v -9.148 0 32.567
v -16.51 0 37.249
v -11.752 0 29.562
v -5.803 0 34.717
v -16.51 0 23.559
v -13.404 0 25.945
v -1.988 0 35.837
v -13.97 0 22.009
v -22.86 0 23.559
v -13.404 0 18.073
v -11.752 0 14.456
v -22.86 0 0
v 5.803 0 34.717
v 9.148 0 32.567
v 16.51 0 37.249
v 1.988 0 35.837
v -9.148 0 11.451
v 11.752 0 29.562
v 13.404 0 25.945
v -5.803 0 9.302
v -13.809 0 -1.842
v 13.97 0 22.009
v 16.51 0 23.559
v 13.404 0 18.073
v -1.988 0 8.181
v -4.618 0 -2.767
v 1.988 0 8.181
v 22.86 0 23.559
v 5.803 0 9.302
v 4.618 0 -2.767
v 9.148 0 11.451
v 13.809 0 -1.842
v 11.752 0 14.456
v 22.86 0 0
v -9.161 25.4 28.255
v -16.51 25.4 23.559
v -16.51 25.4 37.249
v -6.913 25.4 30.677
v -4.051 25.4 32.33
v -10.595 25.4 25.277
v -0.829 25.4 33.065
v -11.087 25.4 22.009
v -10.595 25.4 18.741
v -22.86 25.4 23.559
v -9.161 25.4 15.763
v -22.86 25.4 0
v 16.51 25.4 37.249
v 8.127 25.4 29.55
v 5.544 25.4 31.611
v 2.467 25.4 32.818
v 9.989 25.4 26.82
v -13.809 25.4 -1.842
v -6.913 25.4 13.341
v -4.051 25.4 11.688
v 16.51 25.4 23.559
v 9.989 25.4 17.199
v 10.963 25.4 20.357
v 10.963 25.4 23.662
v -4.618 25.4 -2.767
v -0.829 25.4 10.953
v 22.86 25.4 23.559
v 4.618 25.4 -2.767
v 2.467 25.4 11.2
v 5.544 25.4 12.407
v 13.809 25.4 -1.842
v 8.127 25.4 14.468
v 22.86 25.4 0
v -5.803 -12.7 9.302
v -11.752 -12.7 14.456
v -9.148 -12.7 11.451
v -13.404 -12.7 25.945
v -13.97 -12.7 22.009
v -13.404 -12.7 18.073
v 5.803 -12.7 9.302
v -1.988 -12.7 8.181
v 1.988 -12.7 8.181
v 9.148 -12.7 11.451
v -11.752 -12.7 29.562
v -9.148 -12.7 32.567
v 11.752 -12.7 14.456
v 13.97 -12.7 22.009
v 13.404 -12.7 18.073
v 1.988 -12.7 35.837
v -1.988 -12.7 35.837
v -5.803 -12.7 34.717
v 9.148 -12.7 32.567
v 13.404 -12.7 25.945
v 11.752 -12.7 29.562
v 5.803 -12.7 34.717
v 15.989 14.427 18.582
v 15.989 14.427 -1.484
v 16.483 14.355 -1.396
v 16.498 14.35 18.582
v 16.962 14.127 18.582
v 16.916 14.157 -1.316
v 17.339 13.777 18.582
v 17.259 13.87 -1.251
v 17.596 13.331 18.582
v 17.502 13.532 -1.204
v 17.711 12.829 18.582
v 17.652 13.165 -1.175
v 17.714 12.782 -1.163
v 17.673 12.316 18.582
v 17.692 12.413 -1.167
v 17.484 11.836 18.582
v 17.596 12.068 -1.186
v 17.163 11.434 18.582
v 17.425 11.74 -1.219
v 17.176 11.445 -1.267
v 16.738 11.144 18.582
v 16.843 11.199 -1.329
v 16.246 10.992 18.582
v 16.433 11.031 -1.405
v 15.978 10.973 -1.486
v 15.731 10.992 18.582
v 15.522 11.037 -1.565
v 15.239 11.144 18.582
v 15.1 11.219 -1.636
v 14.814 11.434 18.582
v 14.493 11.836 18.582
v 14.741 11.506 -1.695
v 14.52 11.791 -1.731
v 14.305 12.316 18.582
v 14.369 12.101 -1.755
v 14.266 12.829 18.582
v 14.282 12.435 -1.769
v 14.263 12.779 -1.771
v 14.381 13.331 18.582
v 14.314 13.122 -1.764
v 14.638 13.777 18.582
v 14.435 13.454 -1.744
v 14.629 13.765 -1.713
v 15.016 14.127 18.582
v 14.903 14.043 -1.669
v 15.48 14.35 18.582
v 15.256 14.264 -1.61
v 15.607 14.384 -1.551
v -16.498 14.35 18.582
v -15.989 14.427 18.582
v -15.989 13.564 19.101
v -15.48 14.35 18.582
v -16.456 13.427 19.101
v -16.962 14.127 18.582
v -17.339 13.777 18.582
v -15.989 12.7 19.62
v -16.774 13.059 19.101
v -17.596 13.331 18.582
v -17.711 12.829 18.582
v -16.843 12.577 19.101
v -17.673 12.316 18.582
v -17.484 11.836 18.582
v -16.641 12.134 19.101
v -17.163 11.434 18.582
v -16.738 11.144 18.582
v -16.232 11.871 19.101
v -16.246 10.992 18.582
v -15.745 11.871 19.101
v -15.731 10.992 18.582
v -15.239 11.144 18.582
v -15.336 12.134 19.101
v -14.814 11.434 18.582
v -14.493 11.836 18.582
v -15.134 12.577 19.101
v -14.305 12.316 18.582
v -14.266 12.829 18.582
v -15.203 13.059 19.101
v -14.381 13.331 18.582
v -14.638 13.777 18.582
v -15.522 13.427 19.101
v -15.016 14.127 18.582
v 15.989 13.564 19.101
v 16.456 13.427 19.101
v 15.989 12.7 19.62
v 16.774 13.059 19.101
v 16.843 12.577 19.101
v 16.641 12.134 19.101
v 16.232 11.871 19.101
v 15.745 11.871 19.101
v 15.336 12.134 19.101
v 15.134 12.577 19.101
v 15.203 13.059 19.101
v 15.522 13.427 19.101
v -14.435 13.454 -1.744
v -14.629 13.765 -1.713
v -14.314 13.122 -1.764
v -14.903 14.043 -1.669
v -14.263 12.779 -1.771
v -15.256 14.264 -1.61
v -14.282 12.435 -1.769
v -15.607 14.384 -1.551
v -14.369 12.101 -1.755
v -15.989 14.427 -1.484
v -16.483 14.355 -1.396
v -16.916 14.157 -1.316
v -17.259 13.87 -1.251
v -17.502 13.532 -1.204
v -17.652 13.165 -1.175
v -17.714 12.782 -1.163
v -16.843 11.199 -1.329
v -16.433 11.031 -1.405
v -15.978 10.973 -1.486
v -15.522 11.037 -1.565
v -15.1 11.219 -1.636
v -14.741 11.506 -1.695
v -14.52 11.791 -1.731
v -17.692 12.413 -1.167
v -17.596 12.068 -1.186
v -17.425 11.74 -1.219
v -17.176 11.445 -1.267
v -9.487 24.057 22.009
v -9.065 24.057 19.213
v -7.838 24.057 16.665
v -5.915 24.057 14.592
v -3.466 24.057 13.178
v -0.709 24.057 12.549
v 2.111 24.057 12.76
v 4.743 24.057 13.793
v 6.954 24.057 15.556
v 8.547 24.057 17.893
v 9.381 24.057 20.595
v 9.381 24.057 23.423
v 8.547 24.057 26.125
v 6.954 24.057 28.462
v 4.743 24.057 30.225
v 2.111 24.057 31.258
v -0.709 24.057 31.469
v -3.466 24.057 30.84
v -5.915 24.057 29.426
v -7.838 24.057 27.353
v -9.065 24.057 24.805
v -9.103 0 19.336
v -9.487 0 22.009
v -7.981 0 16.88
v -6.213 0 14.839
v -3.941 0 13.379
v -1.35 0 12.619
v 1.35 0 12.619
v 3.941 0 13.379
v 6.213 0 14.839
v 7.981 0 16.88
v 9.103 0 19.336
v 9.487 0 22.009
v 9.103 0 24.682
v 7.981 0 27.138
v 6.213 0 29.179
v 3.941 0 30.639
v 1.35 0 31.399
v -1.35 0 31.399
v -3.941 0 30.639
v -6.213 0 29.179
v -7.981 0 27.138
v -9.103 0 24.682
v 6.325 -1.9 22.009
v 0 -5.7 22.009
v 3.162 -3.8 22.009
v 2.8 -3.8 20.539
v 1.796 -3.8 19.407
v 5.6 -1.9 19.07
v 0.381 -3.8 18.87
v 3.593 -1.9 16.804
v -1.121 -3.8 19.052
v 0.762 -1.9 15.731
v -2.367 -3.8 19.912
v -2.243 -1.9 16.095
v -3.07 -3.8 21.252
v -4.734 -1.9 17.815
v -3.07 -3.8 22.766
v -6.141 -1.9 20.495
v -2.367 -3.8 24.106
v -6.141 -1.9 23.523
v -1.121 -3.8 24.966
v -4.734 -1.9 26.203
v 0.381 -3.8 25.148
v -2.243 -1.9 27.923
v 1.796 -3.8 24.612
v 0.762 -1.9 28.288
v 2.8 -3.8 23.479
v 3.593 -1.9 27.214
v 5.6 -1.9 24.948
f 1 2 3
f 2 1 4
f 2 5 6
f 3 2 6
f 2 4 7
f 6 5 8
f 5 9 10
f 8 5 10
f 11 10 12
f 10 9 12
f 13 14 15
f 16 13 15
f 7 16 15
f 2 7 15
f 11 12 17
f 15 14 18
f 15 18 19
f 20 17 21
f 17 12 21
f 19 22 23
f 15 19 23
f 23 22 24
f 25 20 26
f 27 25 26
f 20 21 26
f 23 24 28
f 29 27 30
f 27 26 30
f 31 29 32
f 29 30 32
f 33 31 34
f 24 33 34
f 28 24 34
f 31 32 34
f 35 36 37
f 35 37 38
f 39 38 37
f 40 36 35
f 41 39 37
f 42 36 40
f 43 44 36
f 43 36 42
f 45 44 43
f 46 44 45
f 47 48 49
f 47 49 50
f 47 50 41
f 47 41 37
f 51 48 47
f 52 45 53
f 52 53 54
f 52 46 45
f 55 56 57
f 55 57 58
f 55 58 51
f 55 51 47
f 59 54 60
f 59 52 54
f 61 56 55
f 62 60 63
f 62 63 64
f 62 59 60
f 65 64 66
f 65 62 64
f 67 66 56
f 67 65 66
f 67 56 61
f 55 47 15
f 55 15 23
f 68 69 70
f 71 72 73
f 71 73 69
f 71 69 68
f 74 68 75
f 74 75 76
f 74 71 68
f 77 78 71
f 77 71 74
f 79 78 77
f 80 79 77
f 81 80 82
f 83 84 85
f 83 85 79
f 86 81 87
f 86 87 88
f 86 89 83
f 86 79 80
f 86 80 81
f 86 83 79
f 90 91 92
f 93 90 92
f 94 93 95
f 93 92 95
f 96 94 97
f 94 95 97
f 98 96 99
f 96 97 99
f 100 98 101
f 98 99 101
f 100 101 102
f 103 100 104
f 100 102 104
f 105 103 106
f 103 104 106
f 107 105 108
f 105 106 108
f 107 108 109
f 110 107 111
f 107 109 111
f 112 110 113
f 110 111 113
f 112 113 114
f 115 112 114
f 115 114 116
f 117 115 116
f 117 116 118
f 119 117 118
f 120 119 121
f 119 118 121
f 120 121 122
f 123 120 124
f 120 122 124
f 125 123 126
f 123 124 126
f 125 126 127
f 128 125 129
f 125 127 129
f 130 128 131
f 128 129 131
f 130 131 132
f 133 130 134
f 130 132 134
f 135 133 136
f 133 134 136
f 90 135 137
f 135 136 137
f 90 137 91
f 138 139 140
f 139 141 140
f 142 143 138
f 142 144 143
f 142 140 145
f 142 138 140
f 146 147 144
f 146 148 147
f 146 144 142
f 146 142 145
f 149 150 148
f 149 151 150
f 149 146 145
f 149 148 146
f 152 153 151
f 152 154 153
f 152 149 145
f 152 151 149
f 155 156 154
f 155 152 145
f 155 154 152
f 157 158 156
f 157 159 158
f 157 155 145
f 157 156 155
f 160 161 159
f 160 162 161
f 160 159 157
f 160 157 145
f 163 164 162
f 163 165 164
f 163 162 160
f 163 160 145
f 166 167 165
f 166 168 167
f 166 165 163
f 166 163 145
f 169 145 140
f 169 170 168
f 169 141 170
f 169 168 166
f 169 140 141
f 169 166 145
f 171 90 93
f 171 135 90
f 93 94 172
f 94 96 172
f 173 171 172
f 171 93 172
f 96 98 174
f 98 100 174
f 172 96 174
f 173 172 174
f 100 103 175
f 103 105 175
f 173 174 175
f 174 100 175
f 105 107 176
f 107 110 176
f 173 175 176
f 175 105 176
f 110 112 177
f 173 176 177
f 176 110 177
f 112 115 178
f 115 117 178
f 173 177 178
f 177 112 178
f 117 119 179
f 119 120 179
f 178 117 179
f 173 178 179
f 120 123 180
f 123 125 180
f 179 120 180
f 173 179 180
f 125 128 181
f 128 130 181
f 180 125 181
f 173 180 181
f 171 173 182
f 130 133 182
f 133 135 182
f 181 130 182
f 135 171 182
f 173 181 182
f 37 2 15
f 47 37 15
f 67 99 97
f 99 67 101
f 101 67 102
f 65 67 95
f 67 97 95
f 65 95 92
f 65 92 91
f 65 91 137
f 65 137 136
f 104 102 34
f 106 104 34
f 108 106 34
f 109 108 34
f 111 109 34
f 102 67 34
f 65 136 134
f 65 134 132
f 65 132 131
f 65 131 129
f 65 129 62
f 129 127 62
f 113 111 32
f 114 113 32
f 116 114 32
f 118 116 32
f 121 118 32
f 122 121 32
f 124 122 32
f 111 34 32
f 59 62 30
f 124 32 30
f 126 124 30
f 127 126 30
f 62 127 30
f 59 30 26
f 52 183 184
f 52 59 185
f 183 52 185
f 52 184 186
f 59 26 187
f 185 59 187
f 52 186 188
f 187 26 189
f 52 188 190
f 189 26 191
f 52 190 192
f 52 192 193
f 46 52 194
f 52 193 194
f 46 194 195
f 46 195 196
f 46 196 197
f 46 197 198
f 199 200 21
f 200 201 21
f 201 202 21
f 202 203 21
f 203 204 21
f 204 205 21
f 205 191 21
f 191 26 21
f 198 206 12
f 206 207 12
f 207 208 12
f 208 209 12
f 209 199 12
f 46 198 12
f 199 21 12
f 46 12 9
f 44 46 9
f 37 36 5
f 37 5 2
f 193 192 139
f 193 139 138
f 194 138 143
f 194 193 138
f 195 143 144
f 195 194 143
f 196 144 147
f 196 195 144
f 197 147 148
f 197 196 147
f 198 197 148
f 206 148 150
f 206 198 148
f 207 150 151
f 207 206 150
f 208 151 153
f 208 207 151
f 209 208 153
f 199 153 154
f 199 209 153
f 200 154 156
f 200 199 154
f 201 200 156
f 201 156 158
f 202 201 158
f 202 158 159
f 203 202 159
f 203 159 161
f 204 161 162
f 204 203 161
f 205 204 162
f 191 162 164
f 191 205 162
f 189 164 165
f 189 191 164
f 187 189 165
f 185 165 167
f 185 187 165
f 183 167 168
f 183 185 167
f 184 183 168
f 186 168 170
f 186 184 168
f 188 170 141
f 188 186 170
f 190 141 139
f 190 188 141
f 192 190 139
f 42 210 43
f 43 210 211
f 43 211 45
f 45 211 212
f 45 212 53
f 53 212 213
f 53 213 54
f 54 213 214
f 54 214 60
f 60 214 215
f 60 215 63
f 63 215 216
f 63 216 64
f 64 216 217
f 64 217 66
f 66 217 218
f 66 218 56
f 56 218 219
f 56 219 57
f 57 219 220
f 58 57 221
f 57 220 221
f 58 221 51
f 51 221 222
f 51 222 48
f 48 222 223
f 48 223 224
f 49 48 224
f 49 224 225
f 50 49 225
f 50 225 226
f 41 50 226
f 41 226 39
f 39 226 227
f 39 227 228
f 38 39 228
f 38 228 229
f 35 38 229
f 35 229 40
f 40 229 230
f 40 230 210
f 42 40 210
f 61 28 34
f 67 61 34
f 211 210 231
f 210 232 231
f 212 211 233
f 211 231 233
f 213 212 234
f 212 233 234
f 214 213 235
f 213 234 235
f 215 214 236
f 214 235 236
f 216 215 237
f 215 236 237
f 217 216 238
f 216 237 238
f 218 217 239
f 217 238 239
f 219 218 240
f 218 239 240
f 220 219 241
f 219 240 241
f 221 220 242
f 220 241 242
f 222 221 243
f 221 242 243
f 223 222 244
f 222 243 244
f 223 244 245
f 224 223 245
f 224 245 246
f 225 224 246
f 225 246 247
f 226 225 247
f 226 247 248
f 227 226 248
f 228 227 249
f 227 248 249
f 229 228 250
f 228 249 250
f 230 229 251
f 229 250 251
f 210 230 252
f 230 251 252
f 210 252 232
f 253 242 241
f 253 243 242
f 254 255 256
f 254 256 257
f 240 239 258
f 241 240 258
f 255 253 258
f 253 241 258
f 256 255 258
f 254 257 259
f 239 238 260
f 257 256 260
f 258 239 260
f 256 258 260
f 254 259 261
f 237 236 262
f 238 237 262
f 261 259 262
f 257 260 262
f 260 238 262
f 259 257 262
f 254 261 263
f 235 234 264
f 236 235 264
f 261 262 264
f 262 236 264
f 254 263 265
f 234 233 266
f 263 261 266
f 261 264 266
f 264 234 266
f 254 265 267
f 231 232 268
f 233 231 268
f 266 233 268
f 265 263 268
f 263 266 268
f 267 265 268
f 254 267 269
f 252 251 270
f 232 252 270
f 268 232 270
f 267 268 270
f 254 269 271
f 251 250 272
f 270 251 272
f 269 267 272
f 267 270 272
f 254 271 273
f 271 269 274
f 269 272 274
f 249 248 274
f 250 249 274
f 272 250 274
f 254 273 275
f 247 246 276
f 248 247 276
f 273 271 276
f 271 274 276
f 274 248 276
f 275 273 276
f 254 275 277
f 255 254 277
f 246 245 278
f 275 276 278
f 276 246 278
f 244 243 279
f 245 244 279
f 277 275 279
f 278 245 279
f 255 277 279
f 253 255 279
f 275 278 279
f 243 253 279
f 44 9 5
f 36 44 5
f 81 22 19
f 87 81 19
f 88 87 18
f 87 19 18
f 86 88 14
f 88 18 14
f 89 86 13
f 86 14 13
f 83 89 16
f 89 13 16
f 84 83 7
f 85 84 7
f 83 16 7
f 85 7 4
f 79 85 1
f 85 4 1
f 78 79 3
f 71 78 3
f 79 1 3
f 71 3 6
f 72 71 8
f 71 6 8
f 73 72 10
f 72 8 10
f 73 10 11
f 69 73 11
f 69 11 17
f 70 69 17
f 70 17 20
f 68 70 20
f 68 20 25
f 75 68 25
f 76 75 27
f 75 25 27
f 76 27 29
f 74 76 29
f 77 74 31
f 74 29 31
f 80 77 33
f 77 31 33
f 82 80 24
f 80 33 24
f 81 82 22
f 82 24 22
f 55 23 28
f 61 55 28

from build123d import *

# Parameters (mm, degrees)
BOSS_EXTRUDE1_DEPTH                    = 25.4
SKETCH21_R                             = 13.97
BOSS_EXTRUDE2_DEPTH                    = 12.7
F_1_2_14_NPSM_TAPPED_HOLE1_D           = 18.9738
F_1_2_14_NPSM_TAPPED_HOLE1_DEPTH       = 25.4
F_1_2_14_NPSM_TAPPED_HOLE1_CSINK_D     = 22.1742
F_1_2_14_NPSM_TAPPED_HOLE1_CSINK_ANGLE = 100
F_1_2_14_NPSM_TAPPED_HOLE1_TIP         = 5.700304607


with BuildPart() as part:
    # Sketch1 → Boss-Extrude1 (new body)
    with BuildSketch(Plane(origin=(0, 0, 0), x_dir=(1, 0, 0), z_dir=(0, 1, 0))):
        with BuildLine():
            Line((-16.51, -37.249073779), (16.51, -37.249073779))
            Line((16.51, -37.249073779), (16.51, -23.558908882))
            Line((16.51, -23.558908882), (22.86, -23.558908882))
            Line((22.86, -23.558908882), (22.86, 0))
            ThreePointArc((22.86, 0), (0, 2.882926221), (-22.86, 0))
            Line((-22.86, 0), (-22.86, -23.558908882))
            Line((-22.86, -23.558908882), (-16.51, -23.558908882))
            Line((-16.51, -23.558908882), (-16.51, -37.249073779))
        make_face()
    extrude(amount=BOSS_EXTRUDE1_DEPTH)

    # Sketch21 → Boss-Extrude2 (add)
    with BuildSketch(Plane.XZ):
        with Locations((0, 22.009073779)):
            Circle(SKETCH21_R)
    extrude(amount=BOSS_EXTRUDE2_DEPTH)

    # 1/2-14 NPSM Tapped Hole1
    with Locations(Plane(origin=(0, 25.4, 0), x_dir=(1, 0, 0), z_dir=(0, 1, 0))):
        with Locations((0, -22.009073779)):
            CounterSinkHole(F_1_2_14_NPSM_TAPPED_HOLE1_D / 2, F_1_2_14_NPSM_TAPPED_HOLE1_CSINK_D / 2, depth=F_1_2_14_NPSM_TAPPED_HOLE1_DEPTH, counter_sink_angle=F_1_2_14_NPSM_TAPPED_HOLE1_CSINK_ANGLE)
            with Locations((0, 0, -(F_1_2_14_NPSM_TAPPED_HOLE1_DEPTH + F_1_2_14_NPSM_TAPPED_HOLE1_TIP / 2))):  # 118° drill point
                Cone(0, F_1_2_14_NPSM_TAPPED_HOLE1_D / 2, F_1_2_14_NPSM_TAPPED_HOLE1_TIP, mode=Mode.SUBTRACT)

    # Sketch26 → Tap Drill for #8-32 Tap1 (revolve, cut)
    with BuildSketch(Plane(origin=(-15.988655959, 12.7, -2.75410008), x_dir=(0, 1, 0), z_dir=(1, 0, 0))):
        Polygon((0, 0), (0, 22.373806461), (1.7272, 21.336), (1.7272, 0), align=None)
    tap_drill_for_8_32_tap1 = revolve(axis=Axis((-15.988655959, 12.7, -9.10410008), (0, 0, 1)), mode=Mode.SUBTRACT)

    # Mirror1: Tap Drill for #8-32 Tap1 across plane
    add(tap_drill_for_8_32_tap1.mirror(Plane(origin=(0, 0, 0), x_dir=(0, 0, 1), z_dir=(1, 0, 0))), mode=Mode.SUBTRACT)


solid = part.part
